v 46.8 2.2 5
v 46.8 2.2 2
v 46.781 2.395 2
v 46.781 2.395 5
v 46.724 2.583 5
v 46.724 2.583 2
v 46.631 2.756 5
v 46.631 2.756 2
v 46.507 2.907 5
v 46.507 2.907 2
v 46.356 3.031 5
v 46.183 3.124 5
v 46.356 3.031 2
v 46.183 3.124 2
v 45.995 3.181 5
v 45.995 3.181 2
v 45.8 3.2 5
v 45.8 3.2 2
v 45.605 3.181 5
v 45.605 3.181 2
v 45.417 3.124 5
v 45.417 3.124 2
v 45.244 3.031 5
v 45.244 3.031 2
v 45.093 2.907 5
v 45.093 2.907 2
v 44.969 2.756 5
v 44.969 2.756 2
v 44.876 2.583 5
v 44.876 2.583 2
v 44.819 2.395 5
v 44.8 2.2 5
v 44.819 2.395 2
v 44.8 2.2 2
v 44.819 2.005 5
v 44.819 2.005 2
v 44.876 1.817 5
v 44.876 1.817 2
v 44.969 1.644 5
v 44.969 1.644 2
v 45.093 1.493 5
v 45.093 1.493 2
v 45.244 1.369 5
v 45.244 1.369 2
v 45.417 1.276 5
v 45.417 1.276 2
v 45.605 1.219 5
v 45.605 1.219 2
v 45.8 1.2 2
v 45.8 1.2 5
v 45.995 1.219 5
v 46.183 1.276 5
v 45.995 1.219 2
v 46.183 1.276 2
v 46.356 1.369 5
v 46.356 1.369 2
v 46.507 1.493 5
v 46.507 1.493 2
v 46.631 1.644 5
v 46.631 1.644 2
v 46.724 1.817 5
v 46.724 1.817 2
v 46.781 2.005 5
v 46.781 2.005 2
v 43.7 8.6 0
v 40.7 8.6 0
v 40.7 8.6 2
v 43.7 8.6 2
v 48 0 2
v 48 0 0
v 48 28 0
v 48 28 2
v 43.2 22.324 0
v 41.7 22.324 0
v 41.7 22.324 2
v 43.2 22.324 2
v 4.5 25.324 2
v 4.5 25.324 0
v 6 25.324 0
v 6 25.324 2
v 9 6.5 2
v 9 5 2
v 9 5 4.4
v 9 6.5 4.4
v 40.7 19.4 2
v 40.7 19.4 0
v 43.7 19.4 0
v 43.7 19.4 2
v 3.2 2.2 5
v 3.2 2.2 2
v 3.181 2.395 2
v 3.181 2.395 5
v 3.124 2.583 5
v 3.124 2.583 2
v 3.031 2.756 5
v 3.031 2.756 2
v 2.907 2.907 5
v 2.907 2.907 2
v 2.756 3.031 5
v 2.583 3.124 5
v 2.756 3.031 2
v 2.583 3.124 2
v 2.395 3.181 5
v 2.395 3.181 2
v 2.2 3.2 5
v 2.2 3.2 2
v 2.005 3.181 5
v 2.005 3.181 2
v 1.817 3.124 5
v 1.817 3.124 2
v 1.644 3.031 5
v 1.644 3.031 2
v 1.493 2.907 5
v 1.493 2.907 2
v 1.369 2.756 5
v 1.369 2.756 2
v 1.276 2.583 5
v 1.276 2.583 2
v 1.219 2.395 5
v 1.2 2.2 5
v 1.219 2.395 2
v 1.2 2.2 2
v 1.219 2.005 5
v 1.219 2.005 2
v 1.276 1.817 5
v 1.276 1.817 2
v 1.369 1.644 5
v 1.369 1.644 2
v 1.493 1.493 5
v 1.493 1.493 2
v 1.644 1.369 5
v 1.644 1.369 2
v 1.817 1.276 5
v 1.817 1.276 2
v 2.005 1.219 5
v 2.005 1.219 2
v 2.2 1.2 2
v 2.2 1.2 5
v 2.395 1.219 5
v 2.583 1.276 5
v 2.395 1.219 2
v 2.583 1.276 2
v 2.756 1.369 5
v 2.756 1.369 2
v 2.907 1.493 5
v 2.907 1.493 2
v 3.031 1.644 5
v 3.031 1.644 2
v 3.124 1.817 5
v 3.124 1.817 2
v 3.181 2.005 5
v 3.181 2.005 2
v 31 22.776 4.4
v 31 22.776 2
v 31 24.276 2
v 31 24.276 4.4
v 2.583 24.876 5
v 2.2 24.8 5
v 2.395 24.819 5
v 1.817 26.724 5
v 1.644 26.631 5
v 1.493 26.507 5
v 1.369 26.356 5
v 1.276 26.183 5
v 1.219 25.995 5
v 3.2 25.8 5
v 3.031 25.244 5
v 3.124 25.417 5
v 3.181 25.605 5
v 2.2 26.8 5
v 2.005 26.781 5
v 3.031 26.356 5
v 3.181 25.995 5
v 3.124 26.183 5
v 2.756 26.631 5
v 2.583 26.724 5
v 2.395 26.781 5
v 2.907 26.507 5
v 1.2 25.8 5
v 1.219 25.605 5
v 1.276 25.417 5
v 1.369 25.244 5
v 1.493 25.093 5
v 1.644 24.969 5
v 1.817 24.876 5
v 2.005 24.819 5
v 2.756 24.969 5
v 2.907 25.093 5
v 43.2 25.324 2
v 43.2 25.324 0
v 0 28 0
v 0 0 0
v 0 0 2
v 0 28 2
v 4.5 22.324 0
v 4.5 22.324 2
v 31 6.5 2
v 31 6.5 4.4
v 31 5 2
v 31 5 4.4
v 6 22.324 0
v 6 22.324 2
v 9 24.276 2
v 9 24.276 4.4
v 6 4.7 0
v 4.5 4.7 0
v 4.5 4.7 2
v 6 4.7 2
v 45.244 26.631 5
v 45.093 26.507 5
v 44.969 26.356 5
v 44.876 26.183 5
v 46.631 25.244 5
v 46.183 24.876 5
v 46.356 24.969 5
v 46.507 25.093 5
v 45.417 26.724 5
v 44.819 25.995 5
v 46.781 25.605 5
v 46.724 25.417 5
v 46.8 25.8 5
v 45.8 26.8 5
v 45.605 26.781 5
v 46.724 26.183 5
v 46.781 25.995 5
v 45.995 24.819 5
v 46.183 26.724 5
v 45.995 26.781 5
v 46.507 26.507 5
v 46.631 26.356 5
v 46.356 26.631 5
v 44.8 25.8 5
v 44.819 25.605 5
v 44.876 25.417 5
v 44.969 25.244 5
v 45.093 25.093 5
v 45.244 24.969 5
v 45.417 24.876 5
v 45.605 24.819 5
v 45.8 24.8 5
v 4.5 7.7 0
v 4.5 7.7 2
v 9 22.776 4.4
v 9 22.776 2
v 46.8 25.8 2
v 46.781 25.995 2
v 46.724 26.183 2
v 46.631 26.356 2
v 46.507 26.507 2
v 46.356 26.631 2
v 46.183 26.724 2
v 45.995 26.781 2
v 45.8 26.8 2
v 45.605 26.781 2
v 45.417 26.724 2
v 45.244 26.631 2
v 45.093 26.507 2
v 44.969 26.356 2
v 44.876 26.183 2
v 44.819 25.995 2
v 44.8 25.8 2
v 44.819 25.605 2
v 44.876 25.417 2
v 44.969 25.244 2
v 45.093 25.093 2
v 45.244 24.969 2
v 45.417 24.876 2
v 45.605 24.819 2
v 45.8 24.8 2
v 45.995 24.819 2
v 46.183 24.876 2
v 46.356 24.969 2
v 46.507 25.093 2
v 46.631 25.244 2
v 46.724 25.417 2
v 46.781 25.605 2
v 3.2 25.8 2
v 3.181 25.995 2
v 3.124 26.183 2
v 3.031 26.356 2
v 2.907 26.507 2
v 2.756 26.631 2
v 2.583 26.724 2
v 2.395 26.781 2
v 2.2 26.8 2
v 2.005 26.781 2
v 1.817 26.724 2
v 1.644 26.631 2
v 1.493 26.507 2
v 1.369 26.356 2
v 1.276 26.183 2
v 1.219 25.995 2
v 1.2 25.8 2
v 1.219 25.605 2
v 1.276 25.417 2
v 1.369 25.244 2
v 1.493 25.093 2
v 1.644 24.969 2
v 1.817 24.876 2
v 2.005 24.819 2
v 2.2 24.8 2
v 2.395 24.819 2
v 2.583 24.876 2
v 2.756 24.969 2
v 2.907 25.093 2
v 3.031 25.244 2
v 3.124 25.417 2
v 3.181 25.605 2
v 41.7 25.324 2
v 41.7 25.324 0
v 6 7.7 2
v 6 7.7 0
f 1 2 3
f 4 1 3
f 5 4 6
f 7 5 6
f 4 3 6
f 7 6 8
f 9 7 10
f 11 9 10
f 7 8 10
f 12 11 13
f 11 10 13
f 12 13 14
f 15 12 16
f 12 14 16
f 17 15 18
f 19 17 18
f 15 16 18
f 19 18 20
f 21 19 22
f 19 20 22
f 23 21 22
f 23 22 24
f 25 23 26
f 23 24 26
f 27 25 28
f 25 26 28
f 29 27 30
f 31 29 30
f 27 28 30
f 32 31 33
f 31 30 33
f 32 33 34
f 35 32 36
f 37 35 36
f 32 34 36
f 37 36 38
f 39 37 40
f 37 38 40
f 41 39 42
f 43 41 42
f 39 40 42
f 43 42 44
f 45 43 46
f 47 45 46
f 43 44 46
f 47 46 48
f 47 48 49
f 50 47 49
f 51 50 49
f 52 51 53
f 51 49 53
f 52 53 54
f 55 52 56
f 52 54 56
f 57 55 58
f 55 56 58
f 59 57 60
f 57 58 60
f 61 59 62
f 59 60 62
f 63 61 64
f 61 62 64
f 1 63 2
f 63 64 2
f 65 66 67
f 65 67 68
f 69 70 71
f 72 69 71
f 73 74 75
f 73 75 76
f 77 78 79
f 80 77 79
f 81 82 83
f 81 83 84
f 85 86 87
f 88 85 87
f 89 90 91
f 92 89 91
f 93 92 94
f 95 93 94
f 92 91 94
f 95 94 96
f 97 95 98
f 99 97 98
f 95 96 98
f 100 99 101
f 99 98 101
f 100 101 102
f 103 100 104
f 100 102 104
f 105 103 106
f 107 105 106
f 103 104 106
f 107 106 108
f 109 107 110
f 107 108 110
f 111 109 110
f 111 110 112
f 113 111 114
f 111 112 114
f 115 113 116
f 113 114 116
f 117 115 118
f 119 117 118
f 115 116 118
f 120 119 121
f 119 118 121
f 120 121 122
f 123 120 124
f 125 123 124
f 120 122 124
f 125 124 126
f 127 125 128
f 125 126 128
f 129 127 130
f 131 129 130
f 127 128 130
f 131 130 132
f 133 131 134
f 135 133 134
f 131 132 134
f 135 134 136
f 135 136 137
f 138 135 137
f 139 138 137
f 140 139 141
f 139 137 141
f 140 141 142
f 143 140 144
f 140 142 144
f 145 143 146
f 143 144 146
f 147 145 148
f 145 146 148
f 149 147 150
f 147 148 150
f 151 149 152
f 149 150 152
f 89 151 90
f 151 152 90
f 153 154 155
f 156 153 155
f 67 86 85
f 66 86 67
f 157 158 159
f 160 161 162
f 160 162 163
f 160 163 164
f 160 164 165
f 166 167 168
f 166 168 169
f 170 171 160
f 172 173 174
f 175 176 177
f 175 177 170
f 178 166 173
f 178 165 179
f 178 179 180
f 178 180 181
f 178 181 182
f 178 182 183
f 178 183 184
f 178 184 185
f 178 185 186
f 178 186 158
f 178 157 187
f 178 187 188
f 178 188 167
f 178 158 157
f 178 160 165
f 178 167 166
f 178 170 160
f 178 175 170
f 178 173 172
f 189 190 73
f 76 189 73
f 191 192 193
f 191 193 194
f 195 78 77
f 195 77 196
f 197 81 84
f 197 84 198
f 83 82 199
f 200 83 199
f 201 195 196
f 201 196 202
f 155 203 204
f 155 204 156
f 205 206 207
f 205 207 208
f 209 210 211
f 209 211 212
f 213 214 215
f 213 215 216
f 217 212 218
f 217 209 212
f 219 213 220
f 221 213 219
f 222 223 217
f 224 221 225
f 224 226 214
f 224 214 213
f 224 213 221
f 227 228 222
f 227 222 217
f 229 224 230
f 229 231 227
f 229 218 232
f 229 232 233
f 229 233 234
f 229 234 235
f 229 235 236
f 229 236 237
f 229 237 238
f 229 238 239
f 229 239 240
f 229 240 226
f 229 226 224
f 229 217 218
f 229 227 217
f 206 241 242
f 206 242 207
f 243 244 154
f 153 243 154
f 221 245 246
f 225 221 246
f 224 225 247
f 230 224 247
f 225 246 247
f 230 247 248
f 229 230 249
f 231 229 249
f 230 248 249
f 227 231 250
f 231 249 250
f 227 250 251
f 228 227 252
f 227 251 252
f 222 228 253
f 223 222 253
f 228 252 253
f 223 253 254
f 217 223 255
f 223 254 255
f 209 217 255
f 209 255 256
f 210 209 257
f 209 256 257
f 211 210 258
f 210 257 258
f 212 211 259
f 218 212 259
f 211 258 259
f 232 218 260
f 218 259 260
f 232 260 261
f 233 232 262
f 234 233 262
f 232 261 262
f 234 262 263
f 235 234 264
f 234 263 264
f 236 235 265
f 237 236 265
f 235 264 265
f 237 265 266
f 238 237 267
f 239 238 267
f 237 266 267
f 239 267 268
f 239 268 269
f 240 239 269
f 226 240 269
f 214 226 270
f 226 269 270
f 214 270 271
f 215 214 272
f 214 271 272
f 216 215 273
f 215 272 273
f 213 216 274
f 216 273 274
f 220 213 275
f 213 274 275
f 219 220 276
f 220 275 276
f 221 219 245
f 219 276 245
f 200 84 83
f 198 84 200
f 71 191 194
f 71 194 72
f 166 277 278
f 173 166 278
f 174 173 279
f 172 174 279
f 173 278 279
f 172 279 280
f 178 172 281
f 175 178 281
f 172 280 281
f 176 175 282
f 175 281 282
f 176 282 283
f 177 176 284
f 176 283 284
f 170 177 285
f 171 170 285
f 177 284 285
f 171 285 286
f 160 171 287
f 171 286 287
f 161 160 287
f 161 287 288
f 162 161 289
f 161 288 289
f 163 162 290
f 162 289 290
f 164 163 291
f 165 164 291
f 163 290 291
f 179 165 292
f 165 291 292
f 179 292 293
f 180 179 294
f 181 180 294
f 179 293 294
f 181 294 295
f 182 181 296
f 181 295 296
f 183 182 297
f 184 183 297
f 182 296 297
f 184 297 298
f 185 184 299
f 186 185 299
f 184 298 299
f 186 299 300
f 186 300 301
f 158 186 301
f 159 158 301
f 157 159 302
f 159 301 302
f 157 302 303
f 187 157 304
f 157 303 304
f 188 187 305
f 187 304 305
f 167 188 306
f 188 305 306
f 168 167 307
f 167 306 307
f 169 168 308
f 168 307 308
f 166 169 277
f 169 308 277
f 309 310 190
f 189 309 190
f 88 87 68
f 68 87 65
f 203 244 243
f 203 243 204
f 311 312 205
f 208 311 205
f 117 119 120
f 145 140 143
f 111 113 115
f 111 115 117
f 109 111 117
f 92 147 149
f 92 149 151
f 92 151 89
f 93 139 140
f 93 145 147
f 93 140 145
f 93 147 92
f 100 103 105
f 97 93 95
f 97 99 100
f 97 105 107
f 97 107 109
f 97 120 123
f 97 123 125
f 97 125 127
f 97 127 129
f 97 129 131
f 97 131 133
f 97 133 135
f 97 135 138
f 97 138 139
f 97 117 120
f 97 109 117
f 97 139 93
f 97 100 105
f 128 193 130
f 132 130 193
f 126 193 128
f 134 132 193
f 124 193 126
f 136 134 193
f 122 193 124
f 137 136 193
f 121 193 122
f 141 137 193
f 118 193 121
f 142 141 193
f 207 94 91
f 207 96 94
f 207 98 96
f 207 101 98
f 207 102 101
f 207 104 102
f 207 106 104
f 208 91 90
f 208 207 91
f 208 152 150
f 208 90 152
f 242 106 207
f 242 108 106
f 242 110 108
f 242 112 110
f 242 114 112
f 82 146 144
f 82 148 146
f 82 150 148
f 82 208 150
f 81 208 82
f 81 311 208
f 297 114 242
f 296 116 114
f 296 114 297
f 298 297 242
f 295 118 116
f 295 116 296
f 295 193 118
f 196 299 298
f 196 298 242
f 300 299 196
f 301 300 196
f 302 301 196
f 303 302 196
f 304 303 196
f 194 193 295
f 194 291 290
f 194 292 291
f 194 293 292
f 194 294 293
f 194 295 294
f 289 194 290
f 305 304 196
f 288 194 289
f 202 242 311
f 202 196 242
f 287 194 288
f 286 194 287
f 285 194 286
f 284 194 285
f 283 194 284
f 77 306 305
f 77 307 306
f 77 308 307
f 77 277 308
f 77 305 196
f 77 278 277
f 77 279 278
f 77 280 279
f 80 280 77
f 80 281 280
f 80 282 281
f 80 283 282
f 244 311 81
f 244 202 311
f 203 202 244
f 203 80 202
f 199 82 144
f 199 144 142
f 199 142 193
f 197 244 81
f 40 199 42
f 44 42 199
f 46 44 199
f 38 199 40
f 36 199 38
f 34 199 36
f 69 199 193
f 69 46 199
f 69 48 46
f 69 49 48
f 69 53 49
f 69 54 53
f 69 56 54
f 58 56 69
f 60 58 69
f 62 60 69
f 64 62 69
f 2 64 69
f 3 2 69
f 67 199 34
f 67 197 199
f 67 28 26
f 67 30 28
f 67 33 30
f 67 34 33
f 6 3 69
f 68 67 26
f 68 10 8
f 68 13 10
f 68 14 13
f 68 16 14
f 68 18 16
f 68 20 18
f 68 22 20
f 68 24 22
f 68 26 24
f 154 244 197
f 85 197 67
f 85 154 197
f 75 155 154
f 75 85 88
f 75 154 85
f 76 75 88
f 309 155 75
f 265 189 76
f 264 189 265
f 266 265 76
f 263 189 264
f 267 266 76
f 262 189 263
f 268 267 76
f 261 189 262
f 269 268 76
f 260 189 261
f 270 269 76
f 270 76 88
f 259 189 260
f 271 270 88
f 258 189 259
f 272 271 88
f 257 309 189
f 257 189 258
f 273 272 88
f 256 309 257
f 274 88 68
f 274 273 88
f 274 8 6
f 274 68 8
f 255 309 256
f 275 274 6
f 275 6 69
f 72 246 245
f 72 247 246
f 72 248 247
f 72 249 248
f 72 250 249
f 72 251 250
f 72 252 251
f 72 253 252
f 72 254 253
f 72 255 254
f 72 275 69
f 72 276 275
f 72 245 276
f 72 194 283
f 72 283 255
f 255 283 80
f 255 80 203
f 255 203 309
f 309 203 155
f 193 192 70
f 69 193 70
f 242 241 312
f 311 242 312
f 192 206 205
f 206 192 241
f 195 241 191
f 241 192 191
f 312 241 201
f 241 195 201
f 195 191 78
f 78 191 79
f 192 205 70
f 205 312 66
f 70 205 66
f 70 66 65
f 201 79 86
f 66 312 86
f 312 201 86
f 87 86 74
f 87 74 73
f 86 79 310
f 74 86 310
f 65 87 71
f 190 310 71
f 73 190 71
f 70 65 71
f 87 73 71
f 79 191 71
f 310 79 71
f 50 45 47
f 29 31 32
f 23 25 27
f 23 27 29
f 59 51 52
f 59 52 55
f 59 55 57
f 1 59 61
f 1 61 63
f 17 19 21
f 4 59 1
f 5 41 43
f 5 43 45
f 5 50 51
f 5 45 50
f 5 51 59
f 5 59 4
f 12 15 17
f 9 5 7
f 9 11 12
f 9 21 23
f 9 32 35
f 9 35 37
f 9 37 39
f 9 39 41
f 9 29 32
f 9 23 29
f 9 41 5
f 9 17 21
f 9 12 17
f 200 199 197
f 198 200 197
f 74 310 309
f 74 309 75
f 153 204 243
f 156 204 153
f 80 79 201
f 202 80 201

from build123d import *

# Parameters (mm, degrees)
SKETCH_W      = 48
SKETCH_H      = 28
PAD_DEPTH     = 2
SKETCH001_R   = 1
PAD001_DEPTH  = 3
SKETCH003_W   = 1.5
SKETCH003_H   = 3
SKETCH003_W_2 = 3
SKETCH003_H_2 = 10.8
POCKET_DEPTH  = 5.001
SKETCH004_W   = 22
SKETCH004_H   = 1.5
PAD002_DEPTH  = 2.4


with BuildPart() as part:
    # Sketch → Pad (new body)
    with BuildSketch(Plane.XY):
        with Locations((24, 14)):
            Rectangle(SKETCH_W, SKETCH_H)
    extrude(amount=PAD_DEPTH)

    # Sketch001 → Pad001 (new body)
    with BuildSketch(Plane.XY.offset(2)):
        with Locations((2.2, 2.2)):
            Circle(SKETCH001_R)
        with Locations((2.2, 25.8)):
            Circle(SKETCH001_R)
        with Locations((45.8, 25.8)):
            Circle(SKETCH001_R)
        with Locations((45.8, 2.2)):
            Circle(SKETCH001_R)
    extrude(amount=PAD001_DEPTH)

    # Sketch003 → Pocket (cut, through all)
    with BuildSketch(Plane(origin=(0, 0, 0), x_dir=(1, 0, 0), z_dir=(0, 0, -1))):
        with Locations((5.25, -6.2)):
            Rectangle(SKETCH003_W, SKETCH003_H)
        with Locations((5.25, -23.82386)):
            Rectangle(SKETCH003_W, SKETCH003_H)
        with Locations((42.45, -23.82386)):
            Rectangle(SKETCH003_W, SKETCH003_H)
        with Locations((42.2, -14)):
            Rectangle(SKETCH003_W_2, SKETCH003_H_2)
    extrude(amount=-POCKET_DEPTH, mode=Mode.SUBTRACT)

    # Sketch004 → Pad002 (new body)
    with BuildSketch(Plane.XY.offset(2)):
        with Locations((20, 5.75)):
            Rectangle(SKETCH004_W, SKETCH004_H)
        with Locations((20, 23.526215)):
            Rectangle(SKETCH004_W, SKETCH004_H)
    extrude(amount=PAD002_DEPTH)


solid = part.part
